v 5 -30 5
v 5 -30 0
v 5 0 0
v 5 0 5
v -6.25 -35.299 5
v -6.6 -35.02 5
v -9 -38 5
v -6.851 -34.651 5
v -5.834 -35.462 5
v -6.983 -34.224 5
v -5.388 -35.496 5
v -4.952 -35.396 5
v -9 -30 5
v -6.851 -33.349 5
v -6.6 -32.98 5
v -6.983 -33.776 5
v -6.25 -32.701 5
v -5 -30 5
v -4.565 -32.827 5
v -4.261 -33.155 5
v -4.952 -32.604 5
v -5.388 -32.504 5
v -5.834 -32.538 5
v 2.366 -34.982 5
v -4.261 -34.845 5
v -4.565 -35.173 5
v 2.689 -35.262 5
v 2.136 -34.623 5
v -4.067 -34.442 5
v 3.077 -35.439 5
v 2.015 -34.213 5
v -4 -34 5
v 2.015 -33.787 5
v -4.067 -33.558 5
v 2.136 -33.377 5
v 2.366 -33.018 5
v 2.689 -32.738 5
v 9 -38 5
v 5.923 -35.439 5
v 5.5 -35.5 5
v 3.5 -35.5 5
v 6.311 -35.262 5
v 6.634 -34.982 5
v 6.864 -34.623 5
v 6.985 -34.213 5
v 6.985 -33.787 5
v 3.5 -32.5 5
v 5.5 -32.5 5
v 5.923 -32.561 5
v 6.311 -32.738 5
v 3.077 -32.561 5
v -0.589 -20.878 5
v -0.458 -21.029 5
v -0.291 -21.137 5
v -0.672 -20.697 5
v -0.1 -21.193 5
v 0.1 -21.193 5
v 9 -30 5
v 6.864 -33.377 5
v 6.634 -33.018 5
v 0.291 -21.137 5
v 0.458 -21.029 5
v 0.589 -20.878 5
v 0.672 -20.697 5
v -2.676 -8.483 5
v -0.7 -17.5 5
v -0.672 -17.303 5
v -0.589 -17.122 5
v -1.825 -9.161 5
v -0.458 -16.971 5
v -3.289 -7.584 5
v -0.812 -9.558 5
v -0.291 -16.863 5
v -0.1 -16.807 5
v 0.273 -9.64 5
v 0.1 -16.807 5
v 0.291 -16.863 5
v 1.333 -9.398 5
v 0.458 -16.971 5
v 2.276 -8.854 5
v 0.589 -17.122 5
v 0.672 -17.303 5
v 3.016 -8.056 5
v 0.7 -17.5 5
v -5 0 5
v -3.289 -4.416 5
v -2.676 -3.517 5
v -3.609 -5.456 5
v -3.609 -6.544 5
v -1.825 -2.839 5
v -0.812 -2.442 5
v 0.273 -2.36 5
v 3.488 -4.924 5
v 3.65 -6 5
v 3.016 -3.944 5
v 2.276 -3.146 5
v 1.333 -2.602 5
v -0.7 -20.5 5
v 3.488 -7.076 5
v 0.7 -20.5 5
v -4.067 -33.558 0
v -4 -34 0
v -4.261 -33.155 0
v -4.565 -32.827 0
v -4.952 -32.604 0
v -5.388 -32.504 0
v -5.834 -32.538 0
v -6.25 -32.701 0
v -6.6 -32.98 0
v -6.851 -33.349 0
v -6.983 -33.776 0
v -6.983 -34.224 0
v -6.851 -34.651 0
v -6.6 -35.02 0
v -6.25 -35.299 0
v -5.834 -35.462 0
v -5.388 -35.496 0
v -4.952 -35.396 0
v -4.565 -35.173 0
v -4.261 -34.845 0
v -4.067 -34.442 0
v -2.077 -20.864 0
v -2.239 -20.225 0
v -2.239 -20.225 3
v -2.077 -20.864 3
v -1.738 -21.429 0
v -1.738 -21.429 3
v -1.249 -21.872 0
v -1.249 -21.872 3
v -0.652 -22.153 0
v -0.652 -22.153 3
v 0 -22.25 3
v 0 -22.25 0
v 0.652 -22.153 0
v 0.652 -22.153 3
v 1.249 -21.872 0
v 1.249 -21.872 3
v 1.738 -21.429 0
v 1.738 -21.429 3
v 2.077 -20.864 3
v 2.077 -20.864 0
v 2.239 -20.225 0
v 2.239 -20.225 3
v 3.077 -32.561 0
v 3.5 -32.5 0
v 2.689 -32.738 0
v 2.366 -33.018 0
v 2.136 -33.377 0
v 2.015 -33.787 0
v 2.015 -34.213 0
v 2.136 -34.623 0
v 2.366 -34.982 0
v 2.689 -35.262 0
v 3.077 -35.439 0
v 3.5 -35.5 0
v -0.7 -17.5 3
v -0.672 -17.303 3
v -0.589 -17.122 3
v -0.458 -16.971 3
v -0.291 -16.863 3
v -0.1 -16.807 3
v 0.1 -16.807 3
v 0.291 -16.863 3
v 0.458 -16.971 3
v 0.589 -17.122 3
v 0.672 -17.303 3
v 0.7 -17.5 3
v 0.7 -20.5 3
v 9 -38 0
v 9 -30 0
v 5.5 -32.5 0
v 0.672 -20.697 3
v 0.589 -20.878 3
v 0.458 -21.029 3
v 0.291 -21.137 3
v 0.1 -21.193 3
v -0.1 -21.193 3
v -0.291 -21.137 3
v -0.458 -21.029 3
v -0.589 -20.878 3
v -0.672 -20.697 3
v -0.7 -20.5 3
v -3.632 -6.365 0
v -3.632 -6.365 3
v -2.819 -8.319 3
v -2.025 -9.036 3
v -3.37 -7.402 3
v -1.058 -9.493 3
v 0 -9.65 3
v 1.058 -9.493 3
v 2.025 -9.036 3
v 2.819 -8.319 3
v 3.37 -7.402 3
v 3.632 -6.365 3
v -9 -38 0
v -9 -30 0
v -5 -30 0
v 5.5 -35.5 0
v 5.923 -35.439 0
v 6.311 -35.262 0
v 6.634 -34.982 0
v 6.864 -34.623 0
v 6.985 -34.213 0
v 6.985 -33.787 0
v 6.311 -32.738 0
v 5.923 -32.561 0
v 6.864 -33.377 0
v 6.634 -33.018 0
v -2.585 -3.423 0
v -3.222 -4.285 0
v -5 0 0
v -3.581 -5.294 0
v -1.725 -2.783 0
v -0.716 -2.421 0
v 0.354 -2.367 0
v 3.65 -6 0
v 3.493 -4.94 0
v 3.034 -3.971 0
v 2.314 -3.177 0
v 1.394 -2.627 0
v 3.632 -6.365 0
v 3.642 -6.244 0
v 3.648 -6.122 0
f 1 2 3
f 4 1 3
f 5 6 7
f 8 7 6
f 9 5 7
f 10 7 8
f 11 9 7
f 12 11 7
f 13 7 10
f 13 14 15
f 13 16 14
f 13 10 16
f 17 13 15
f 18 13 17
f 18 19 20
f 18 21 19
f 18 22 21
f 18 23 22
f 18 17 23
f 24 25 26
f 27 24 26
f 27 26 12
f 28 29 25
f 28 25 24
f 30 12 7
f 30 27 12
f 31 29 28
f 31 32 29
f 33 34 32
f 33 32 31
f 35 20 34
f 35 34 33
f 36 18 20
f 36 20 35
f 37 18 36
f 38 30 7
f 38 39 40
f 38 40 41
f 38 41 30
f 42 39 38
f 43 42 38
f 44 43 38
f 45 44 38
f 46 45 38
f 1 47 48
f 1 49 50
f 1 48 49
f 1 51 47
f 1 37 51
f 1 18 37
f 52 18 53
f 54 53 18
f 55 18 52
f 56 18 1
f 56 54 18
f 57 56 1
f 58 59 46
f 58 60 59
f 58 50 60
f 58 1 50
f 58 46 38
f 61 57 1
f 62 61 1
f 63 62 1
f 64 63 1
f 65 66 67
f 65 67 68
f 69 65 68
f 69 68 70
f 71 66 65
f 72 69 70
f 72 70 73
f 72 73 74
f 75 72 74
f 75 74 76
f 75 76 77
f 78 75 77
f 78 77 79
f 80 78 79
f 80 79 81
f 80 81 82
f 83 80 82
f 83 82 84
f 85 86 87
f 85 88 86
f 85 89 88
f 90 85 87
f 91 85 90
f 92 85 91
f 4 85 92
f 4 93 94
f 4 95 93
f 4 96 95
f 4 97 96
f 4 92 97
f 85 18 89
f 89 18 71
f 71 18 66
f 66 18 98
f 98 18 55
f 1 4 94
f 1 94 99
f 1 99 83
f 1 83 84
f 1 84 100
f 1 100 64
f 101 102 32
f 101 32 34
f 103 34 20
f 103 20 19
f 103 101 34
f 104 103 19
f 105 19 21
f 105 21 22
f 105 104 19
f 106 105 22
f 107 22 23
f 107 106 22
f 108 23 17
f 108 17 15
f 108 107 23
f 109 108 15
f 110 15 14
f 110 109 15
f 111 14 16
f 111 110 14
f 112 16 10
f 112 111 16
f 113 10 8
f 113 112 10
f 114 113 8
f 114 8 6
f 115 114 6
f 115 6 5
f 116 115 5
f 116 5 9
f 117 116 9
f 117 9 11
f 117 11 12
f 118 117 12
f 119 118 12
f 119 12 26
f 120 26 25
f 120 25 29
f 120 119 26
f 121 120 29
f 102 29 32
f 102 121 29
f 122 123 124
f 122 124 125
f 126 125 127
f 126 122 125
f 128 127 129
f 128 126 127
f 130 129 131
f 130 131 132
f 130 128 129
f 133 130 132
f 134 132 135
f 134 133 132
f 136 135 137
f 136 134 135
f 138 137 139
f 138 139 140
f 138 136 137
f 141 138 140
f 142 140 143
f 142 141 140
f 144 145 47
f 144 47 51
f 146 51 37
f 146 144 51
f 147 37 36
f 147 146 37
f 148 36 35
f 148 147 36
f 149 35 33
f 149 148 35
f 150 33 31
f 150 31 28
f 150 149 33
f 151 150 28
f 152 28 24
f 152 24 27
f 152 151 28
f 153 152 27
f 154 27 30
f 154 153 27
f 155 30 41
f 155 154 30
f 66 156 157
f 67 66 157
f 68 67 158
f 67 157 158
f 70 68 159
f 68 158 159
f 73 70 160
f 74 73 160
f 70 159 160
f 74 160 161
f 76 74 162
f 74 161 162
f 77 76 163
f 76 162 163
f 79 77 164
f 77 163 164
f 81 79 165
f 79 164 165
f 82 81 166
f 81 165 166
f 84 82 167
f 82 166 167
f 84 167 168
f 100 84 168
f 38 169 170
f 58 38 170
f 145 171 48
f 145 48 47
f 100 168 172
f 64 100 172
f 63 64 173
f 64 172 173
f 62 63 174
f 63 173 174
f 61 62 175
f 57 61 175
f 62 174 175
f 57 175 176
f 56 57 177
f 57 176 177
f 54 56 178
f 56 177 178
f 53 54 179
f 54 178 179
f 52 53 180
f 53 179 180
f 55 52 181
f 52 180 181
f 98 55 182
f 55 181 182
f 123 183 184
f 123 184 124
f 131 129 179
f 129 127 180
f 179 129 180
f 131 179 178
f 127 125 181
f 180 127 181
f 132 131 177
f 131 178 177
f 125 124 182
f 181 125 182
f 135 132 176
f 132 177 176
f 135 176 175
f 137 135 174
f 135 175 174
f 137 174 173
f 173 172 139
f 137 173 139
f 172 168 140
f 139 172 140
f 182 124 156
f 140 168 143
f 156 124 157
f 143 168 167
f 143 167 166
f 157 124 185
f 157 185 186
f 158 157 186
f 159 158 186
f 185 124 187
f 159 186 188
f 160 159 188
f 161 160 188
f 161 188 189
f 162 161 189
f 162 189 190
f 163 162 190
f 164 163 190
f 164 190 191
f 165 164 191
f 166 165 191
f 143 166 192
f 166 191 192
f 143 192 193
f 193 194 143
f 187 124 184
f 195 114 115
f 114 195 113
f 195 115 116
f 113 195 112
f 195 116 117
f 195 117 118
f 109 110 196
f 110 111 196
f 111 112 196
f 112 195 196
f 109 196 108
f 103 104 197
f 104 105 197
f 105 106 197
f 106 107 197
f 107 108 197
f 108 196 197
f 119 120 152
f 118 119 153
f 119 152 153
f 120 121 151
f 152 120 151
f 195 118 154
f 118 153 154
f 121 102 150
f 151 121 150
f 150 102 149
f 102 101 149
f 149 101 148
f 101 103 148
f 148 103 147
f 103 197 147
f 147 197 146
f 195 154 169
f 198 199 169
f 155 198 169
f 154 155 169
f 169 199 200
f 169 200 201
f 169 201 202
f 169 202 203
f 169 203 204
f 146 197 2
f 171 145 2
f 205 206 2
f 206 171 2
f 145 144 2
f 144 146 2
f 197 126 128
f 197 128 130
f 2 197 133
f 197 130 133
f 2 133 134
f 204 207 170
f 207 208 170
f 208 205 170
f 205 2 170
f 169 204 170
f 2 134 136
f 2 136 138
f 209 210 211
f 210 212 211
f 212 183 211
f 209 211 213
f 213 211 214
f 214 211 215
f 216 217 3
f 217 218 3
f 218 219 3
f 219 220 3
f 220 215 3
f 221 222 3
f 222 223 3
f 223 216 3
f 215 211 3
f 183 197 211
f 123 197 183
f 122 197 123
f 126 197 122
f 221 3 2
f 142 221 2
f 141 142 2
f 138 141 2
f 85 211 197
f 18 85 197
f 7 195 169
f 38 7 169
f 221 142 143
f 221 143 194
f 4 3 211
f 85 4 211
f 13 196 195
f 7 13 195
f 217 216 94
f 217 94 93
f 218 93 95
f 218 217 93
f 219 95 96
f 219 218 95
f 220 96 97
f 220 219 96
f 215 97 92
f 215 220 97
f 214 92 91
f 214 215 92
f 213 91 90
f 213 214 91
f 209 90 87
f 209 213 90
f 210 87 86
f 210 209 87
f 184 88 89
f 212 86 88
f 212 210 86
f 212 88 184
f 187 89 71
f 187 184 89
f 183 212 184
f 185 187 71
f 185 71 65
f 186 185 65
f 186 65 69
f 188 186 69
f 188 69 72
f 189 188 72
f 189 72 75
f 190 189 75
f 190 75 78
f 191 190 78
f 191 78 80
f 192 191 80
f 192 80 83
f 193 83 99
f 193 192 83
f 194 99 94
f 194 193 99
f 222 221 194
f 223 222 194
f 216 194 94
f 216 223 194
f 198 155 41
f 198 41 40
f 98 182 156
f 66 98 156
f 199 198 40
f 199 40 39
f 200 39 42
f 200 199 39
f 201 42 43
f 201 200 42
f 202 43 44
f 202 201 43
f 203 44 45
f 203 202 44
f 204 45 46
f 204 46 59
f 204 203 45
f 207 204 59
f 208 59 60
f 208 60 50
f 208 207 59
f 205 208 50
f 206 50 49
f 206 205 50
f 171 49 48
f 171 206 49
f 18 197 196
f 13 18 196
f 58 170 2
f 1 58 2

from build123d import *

# Parameters (mm, degrees)
ESBO_O1_R                = 1.5
ESBO_O1_R_2              = 3.65
RESSALTO_EXTRUS_O1_DEPTH = 5
CORTE_EXTRUS_O1_DEPTH    = 3


with BuildPart() as part:
    # Esboço1 → Ressalto-extrusão1 (new body)
    with BuildSketch(Plane.XY):
        Polygon((5, 0), (0, 0), (-5, 0), (-5, -30), (-9, -30), (-9, -38), (9, -38), (9, -30), (5, -30), align=None)
        with Locations((-5.5, -34)):
            Circle(ESBO_O1_R, mode=Mode.SUBTRACT)
        with BuildLine():
            Line((3.5, -32.5), (5.5, -32.5))
            ThreePointArc((5.5, -32.5), (7, -34), (5.5, -35.5))
            Line((5.5, -35.5), (3.5, -35.5))
            ThreePointArc((3.5, -35.5), (2, -34), (3.5, -32.5))
        make_face(mode=Mode.SUBTRACT)
        with Locations((0, -6)):
            Circle(ESBO_O1_R_2, mode=Mode.SUBTRACT)
        with BuildLine():
            ThreePointArc((-0.7, -17.5), (0, -16.8), (0.7, -17.5))
            Line((0.7, -17.5), (0.7, -20.5))
            ThreePointArc((0.7, -20.5), (0, -21.2), (-0.7, -20.5))
            Line((-0.7, -20.5), (-0.7, -17.5))
        make_face(mode=Mode.SUBTRACT)
    extrude(amount=RESSALTO_EXTRUS_O1_DEPTH)

    # Esboço1<3> → Corte-extrusão1 (cut)
    with BuildSketch(Plane.XY):
        with BuildLine():
            ThreePointArc((-2.238721733, -20.225), (0, -22.25), (2.238721733, -20.225))
            Line((2.238721733, -20.225), (3.631704145, -6.365))
            ThreePointArc((3.631704145, -6.365), (0, -9.65), (-3.631704145, -6.365))
            Line((-3.631704145, -6.365), (-2.238721733, -20.225))
        make_face()
        with BuildLine():
            ThreePointArc((0.7, -20.5), (0, -21.2), (-0.7, -20.5))
            Line((-0.7, -20.5), (-0.7, -17.5))
            ThreePointArc((-0.7, -17.5), (0, -16.8), (0.7, -17.5))
            Line((0.7, -17.5), (0.7, -20.5))
        make_face(mode=Mode.SUBTRACT)
    extrude(amount=CORTE_EXTRUS_O1_DEPTH, mode=Mode.SUBTRACT)


solid = part.part
